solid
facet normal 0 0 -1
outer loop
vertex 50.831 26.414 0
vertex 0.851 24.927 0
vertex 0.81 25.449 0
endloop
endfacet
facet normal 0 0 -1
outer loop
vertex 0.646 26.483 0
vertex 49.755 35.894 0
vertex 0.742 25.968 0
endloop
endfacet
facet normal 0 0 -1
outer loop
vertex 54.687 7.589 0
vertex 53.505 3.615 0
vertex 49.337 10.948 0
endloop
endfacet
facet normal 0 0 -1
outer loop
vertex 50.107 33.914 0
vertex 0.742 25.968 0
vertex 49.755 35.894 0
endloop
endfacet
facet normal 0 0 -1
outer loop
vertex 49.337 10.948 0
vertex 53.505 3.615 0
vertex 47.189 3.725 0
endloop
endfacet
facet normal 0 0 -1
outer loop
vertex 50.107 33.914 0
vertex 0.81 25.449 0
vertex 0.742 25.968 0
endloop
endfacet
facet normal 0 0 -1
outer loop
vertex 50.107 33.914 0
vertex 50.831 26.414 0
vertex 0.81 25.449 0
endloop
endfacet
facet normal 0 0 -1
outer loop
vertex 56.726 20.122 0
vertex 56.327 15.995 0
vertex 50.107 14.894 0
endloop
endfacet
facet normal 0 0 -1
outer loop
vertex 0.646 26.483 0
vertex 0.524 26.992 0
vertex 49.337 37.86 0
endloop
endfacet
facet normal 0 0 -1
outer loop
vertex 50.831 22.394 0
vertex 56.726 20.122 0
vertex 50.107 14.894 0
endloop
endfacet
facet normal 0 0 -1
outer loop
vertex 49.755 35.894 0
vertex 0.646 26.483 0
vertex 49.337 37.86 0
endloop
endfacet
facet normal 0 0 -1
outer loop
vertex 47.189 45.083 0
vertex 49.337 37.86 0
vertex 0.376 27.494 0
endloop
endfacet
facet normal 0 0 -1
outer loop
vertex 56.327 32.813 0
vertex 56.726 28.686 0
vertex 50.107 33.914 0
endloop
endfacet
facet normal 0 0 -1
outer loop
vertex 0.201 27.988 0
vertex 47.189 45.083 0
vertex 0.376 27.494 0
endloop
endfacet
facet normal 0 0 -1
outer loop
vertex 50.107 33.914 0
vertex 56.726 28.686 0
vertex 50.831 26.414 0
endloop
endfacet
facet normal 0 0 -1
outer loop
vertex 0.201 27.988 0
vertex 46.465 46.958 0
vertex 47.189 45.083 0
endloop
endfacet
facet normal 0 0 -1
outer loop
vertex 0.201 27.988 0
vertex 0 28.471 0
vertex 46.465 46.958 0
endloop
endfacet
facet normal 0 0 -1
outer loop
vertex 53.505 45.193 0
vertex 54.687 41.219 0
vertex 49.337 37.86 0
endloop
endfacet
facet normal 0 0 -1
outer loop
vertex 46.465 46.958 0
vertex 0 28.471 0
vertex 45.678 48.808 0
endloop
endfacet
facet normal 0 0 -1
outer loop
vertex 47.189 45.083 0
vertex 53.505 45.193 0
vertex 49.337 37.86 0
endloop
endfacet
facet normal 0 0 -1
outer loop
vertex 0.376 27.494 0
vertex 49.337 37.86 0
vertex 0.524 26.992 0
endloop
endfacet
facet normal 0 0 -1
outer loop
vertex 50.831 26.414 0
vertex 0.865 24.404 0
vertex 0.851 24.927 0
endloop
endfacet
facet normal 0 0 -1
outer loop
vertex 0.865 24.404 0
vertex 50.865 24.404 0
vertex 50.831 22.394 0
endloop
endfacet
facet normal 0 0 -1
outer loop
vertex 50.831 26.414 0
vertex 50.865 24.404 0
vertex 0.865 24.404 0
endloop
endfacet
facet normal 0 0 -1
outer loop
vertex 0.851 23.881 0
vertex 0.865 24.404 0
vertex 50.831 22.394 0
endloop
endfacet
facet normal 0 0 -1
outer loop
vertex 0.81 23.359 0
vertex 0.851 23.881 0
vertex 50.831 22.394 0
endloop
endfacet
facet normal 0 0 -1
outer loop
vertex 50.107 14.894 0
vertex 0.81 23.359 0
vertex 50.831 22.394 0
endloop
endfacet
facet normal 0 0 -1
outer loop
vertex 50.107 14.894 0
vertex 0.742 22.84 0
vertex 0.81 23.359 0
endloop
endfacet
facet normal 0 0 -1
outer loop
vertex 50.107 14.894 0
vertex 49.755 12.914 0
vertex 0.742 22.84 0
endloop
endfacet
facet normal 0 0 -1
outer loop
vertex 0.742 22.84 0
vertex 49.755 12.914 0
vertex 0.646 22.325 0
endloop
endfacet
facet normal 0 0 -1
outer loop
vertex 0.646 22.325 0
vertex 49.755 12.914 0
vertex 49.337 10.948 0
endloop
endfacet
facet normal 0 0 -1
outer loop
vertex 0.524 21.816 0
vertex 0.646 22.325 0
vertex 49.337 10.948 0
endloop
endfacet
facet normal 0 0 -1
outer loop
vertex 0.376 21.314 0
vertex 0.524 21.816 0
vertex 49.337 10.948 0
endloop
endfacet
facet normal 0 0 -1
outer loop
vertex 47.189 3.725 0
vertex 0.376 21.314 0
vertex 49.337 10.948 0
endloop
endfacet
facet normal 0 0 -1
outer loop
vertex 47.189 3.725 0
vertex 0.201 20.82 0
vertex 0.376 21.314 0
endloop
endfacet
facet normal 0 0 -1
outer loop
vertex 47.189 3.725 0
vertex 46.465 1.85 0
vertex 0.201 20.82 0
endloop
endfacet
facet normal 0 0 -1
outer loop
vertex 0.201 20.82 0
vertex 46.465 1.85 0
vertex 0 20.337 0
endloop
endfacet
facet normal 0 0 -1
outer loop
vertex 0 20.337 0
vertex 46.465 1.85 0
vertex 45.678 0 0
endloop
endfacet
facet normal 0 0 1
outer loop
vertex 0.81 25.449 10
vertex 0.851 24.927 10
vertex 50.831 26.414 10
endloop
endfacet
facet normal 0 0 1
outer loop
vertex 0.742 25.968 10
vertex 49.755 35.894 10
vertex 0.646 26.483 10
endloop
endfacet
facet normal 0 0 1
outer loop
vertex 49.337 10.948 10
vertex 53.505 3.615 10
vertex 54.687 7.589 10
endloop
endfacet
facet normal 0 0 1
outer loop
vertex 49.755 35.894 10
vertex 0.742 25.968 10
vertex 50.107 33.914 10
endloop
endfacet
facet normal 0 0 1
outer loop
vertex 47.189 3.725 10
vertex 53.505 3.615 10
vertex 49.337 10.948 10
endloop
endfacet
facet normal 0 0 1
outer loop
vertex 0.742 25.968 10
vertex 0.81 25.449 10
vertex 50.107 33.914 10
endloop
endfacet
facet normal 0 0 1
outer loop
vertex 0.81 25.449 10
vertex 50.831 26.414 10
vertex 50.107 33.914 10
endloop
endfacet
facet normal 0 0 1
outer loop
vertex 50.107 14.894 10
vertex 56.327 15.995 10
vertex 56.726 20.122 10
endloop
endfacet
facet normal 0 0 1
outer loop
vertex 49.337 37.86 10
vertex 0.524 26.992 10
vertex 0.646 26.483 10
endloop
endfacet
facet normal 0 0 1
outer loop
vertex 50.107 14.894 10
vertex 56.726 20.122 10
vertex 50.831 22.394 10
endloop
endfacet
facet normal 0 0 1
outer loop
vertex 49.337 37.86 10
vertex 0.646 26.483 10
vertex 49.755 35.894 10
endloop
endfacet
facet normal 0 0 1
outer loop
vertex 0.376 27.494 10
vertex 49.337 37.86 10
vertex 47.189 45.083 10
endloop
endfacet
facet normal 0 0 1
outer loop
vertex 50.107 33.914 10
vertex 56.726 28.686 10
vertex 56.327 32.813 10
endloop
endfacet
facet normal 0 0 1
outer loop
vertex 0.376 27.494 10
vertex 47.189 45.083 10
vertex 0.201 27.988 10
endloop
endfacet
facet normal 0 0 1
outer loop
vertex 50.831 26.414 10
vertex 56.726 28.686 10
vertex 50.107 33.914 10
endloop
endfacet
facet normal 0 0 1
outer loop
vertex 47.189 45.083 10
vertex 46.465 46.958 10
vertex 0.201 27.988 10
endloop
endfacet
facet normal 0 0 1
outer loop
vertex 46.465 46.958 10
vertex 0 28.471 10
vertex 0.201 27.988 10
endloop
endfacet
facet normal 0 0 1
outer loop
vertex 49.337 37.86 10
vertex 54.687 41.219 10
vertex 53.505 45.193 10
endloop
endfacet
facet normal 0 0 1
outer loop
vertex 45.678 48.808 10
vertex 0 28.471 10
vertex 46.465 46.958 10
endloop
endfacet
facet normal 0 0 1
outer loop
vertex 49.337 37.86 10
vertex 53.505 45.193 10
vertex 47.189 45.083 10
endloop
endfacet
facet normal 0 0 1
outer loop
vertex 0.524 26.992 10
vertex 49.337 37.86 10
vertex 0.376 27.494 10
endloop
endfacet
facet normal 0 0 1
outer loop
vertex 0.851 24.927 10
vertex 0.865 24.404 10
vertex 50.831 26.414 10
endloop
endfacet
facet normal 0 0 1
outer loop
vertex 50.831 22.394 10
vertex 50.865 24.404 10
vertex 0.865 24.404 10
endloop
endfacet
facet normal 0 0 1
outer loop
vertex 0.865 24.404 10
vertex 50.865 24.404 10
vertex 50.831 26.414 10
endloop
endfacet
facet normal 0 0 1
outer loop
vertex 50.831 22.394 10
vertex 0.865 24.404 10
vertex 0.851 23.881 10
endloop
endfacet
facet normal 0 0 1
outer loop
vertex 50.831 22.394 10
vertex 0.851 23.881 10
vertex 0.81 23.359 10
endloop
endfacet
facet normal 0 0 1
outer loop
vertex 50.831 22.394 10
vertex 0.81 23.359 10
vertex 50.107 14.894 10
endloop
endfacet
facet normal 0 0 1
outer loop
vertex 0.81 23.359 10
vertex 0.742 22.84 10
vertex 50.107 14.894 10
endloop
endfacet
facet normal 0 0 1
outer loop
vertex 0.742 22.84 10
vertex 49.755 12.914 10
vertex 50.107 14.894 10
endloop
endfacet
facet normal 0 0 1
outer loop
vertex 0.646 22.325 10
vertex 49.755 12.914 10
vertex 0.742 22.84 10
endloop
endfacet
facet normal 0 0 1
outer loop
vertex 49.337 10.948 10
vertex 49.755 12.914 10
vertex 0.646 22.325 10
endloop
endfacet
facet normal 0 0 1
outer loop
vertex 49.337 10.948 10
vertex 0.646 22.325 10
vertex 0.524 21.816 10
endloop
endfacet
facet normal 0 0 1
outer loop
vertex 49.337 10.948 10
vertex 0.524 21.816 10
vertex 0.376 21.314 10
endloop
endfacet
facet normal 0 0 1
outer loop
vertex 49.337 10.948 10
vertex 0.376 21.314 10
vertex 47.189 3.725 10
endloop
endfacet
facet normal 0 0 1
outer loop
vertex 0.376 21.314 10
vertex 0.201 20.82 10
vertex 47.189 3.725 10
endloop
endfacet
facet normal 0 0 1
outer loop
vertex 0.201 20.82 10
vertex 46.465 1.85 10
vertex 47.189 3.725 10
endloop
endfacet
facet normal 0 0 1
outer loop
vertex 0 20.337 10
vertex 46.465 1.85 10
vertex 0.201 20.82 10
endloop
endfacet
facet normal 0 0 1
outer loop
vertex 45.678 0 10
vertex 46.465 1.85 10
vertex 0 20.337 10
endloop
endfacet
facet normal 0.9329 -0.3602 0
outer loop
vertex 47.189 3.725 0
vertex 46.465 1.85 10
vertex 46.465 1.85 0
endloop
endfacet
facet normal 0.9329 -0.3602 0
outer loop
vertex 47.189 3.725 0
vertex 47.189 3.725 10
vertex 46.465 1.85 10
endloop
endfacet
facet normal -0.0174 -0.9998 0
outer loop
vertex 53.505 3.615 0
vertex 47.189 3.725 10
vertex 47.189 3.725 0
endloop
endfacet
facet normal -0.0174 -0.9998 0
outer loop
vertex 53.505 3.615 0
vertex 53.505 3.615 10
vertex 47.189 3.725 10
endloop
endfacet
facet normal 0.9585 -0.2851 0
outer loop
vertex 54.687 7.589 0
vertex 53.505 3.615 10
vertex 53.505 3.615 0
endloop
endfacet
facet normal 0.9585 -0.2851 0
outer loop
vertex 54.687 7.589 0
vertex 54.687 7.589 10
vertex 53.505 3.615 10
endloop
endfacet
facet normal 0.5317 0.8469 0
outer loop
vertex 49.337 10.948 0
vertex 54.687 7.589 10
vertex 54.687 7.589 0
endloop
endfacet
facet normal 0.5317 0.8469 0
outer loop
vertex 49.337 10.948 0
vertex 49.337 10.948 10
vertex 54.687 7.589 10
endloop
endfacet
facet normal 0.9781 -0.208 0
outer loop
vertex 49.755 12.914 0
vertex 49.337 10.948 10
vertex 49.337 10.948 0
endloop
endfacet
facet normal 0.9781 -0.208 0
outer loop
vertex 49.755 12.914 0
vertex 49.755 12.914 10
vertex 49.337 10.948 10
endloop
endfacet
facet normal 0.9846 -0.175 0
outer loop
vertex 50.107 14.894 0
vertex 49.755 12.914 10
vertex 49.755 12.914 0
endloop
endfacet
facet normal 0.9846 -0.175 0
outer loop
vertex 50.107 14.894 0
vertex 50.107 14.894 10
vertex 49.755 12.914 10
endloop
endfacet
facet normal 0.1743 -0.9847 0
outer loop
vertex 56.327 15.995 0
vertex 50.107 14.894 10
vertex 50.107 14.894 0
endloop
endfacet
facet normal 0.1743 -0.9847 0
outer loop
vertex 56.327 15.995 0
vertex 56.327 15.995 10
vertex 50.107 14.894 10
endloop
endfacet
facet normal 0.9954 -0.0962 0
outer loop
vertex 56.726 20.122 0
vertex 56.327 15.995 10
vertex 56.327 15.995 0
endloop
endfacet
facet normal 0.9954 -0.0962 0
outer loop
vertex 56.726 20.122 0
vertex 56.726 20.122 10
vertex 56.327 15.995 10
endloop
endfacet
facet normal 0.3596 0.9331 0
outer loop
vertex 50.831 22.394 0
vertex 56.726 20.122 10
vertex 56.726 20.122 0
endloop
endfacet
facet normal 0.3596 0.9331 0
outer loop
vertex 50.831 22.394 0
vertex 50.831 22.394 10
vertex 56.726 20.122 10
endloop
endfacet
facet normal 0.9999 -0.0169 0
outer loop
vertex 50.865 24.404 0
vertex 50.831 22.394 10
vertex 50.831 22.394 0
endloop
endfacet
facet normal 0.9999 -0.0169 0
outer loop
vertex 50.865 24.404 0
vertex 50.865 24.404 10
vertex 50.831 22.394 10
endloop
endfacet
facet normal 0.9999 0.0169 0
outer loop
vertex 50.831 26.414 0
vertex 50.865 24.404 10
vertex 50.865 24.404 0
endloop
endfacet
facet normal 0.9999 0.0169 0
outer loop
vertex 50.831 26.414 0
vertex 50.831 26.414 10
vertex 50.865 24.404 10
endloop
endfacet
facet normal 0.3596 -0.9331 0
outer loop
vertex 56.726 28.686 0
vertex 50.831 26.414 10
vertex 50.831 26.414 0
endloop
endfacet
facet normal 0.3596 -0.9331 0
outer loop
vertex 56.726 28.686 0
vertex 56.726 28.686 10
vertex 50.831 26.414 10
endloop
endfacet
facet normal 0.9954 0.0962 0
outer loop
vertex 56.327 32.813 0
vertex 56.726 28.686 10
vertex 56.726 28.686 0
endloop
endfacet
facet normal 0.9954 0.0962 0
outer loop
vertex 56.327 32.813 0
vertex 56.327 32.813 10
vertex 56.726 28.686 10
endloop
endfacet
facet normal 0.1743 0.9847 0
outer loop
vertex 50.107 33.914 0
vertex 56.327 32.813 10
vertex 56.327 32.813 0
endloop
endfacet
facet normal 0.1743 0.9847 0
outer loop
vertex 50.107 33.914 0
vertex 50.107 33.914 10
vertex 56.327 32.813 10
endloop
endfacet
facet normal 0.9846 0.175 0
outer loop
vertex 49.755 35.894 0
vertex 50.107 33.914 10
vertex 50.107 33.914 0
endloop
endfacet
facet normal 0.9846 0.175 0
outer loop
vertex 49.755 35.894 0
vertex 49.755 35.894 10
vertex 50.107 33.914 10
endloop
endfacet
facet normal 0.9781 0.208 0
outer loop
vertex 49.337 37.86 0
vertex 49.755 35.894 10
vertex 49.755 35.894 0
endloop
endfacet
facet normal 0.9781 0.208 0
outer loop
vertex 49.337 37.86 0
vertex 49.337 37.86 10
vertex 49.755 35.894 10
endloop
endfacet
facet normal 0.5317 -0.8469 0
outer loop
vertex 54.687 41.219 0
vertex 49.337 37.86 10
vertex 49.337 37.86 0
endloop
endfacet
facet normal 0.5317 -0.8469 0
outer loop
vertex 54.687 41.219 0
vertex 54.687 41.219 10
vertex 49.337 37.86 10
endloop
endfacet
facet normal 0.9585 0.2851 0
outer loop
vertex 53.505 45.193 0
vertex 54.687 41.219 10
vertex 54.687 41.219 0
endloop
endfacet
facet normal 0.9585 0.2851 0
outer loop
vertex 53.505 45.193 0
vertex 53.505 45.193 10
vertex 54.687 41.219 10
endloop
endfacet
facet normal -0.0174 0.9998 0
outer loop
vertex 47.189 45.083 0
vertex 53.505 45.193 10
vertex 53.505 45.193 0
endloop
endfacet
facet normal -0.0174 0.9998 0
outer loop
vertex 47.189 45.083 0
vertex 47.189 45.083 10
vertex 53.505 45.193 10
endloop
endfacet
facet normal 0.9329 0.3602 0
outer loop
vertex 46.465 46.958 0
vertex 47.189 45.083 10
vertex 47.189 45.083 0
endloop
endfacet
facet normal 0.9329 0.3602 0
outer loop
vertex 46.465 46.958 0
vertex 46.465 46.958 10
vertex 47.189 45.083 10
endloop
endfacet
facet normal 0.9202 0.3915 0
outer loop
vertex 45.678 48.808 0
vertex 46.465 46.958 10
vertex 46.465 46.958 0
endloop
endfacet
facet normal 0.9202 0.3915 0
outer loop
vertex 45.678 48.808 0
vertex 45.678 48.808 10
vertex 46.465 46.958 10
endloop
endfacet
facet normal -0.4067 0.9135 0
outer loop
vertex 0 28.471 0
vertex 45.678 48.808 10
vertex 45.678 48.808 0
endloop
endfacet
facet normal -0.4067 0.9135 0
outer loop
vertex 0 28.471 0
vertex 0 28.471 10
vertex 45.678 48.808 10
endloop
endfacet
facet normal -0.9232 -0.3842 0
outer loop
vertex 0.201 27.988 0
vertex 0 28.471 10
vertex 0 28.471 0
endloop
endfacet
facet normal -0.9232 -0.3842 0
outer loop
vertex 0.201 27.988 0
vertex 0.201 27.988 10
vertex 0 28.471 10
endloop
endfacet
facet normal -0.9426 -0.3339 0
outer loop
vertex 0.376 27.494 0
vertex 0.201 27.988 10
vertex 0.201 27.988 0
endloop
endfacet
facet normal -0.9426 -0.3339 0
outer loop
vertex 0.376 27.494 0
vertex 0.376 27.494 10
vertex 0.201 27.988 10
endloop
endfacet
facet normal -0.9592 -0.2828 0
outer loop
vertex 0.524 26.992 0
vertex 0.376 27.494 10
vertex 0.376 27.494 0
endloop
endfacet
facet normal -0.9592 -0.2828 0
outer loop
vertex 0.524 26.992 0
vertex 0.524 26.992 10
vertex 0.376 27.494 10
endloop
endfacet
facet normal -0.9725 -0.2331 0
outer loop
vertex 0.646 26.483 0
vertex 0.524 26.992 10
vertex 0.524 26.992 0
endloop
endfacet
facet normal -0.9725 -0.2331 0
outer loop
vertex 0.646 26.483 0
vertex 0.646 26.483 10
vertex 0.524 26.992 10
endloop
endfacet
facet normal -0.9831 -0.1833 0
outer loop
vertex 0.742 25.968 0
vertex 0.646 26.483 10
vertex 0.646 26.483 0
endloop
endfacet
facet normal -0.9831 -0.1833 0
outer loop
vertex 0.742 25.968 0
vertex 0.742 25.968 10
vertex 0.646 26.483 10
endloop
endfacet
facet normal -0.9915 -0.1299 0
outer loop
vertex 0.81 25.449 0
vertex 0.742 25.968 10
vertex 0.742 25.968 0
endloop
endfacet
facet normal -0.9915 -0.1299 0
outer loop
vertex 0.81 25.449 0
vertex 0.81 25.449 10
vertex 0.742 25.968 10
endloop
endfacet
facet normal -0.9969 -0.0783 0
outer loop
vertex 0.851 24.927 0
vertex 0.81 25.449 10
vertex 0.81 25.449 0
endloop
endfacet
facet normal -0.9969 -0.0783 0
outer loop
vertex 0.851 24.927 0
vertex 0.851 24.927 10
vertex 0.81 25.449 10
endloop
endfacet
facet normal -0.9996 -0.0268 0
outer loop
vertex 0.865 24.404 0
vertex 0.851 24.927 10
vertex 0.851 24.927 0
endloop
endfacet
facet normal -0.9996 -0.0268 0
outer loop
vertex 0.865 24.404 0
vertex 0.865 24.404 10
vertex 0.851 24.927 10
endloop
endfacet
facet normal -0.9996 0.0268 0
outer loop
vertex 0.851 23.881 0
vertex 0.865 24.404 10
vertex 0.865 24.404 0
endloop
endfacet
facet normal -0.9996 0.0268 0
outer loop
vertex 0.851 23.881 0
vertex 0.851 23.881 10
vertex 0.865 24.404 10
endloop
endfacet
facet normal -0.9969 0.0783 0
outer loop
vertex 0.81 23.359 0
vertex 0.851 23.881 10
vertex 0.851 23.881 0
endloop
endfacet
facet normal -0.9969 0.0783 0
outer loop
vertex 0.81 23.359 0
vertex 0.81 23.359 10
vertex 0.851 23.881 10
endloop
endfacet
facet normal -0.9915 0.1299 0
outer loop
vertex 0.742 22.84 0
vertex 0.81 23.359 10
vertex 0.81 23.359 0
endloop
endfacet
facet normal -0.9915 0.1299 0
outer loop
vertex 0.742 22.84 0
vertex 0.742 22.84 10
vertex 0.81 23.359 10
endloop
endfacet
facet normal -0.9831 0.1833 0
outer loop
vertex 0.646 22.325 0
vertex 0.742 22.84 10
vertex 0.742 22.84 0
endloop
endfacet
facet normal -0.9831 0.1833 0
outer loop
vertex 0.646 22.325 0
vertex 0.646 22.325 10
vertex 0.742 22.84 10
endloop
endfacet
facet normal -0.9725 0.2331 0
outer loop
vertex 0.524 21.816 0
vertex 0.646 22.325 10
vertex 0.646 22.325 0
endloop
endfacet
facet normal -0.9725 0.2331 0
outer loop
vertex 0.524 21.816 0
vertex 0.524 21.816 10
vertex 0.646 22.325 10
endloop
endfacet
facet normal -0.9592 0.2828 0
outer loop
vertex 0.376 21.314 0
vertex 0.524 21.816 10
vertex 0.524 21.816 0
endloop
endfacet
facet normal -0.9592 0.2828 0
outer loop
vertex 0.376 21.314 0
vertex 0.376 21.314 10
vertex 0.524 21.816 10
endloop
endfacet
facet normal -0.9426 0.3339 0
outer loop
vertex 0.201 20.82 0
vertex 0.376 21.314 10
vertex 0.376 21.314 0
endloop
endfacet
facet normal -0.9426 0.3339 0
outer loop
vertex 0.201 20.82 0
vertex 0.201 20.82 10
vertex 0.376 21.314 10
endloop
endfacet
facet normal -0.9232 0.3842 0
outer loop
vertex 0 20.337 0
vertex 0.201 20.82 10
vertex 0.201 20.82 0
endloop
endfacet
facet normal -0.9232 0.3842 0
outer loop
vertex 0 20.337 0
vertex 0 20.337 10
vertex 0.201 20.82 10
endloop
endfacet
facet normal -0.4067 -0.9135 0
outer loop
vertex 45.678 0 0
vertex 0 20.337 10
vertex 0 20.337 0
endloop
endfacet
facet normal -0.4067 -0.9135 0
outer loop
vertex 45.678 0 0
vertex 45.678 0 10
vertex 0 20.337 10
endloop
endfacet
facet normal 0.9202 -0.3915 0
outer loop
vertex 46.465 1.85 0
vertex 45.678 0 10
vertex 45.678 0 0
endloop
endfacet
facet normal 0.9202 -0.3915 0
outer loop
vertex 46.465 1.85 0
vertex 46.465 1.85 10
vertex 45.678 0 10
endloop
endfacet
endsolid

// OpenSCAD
$fn = 32;

// ----------------------------------------------------------------------
// Gear sector: 4 teeth on 48 degrees
// ----------------------------------------------------------------------

// --- parameters (mm) ---
sector_angle = 48;        // sector angle, degrees
root_r = 60;              // root circle radius
tooth_h = 6;              // tooth height over the root circle
teeth = 4;                // number of teeth on the sector
hub_r = 10;               // hub bore radius
plate_t = 10;             // sector thickness, Z
arc_step = 3;             // sampling step of the root/hub arcs, degrees

tip_r = root_r + tooth_h;  // tip circle radius

profile = [[45.678, 0], [46.465, 1.85], [47.189, 3.725], [53.505, 3.615], [54.687, 7.589], [49.337, 10.948], [49.755, 12.914], [50.107, 14.894], [56.327, 15.995], [56.726, 20.122], [50.831, 22.394], [50.865, 24.404], [50.831, 26.414], [56.726, 28.686], [56.327, 32.813], [50.107, 33.914], [49.755, 35.894], [49.337, 37.86], [54.687, 41.219], [53.505, 45.193], [47.189, 45.083], [46.465, 46.958], [45.678, 48.808], [0, 28.471], [0.201, 27.988], [0.376, 27.494], [0.524, 26.992], [0.646, 26.483], [0.742, 25.968], [0.81, 25.449], [0.851, 24.927], [0.865, 24.404], [0.851, 23.881], [0.81, 23.359], [0.742, 22.84], [0.646, 22.325], [0.524, 21.816], [0.376, 21.314], [0.201, 20.82], [0, 20.337]];  // primary outline, 40 points, counter clockwise

// --- the one profile operation ---
linear_extrude(height = plate_t) polygon(points = profile);
